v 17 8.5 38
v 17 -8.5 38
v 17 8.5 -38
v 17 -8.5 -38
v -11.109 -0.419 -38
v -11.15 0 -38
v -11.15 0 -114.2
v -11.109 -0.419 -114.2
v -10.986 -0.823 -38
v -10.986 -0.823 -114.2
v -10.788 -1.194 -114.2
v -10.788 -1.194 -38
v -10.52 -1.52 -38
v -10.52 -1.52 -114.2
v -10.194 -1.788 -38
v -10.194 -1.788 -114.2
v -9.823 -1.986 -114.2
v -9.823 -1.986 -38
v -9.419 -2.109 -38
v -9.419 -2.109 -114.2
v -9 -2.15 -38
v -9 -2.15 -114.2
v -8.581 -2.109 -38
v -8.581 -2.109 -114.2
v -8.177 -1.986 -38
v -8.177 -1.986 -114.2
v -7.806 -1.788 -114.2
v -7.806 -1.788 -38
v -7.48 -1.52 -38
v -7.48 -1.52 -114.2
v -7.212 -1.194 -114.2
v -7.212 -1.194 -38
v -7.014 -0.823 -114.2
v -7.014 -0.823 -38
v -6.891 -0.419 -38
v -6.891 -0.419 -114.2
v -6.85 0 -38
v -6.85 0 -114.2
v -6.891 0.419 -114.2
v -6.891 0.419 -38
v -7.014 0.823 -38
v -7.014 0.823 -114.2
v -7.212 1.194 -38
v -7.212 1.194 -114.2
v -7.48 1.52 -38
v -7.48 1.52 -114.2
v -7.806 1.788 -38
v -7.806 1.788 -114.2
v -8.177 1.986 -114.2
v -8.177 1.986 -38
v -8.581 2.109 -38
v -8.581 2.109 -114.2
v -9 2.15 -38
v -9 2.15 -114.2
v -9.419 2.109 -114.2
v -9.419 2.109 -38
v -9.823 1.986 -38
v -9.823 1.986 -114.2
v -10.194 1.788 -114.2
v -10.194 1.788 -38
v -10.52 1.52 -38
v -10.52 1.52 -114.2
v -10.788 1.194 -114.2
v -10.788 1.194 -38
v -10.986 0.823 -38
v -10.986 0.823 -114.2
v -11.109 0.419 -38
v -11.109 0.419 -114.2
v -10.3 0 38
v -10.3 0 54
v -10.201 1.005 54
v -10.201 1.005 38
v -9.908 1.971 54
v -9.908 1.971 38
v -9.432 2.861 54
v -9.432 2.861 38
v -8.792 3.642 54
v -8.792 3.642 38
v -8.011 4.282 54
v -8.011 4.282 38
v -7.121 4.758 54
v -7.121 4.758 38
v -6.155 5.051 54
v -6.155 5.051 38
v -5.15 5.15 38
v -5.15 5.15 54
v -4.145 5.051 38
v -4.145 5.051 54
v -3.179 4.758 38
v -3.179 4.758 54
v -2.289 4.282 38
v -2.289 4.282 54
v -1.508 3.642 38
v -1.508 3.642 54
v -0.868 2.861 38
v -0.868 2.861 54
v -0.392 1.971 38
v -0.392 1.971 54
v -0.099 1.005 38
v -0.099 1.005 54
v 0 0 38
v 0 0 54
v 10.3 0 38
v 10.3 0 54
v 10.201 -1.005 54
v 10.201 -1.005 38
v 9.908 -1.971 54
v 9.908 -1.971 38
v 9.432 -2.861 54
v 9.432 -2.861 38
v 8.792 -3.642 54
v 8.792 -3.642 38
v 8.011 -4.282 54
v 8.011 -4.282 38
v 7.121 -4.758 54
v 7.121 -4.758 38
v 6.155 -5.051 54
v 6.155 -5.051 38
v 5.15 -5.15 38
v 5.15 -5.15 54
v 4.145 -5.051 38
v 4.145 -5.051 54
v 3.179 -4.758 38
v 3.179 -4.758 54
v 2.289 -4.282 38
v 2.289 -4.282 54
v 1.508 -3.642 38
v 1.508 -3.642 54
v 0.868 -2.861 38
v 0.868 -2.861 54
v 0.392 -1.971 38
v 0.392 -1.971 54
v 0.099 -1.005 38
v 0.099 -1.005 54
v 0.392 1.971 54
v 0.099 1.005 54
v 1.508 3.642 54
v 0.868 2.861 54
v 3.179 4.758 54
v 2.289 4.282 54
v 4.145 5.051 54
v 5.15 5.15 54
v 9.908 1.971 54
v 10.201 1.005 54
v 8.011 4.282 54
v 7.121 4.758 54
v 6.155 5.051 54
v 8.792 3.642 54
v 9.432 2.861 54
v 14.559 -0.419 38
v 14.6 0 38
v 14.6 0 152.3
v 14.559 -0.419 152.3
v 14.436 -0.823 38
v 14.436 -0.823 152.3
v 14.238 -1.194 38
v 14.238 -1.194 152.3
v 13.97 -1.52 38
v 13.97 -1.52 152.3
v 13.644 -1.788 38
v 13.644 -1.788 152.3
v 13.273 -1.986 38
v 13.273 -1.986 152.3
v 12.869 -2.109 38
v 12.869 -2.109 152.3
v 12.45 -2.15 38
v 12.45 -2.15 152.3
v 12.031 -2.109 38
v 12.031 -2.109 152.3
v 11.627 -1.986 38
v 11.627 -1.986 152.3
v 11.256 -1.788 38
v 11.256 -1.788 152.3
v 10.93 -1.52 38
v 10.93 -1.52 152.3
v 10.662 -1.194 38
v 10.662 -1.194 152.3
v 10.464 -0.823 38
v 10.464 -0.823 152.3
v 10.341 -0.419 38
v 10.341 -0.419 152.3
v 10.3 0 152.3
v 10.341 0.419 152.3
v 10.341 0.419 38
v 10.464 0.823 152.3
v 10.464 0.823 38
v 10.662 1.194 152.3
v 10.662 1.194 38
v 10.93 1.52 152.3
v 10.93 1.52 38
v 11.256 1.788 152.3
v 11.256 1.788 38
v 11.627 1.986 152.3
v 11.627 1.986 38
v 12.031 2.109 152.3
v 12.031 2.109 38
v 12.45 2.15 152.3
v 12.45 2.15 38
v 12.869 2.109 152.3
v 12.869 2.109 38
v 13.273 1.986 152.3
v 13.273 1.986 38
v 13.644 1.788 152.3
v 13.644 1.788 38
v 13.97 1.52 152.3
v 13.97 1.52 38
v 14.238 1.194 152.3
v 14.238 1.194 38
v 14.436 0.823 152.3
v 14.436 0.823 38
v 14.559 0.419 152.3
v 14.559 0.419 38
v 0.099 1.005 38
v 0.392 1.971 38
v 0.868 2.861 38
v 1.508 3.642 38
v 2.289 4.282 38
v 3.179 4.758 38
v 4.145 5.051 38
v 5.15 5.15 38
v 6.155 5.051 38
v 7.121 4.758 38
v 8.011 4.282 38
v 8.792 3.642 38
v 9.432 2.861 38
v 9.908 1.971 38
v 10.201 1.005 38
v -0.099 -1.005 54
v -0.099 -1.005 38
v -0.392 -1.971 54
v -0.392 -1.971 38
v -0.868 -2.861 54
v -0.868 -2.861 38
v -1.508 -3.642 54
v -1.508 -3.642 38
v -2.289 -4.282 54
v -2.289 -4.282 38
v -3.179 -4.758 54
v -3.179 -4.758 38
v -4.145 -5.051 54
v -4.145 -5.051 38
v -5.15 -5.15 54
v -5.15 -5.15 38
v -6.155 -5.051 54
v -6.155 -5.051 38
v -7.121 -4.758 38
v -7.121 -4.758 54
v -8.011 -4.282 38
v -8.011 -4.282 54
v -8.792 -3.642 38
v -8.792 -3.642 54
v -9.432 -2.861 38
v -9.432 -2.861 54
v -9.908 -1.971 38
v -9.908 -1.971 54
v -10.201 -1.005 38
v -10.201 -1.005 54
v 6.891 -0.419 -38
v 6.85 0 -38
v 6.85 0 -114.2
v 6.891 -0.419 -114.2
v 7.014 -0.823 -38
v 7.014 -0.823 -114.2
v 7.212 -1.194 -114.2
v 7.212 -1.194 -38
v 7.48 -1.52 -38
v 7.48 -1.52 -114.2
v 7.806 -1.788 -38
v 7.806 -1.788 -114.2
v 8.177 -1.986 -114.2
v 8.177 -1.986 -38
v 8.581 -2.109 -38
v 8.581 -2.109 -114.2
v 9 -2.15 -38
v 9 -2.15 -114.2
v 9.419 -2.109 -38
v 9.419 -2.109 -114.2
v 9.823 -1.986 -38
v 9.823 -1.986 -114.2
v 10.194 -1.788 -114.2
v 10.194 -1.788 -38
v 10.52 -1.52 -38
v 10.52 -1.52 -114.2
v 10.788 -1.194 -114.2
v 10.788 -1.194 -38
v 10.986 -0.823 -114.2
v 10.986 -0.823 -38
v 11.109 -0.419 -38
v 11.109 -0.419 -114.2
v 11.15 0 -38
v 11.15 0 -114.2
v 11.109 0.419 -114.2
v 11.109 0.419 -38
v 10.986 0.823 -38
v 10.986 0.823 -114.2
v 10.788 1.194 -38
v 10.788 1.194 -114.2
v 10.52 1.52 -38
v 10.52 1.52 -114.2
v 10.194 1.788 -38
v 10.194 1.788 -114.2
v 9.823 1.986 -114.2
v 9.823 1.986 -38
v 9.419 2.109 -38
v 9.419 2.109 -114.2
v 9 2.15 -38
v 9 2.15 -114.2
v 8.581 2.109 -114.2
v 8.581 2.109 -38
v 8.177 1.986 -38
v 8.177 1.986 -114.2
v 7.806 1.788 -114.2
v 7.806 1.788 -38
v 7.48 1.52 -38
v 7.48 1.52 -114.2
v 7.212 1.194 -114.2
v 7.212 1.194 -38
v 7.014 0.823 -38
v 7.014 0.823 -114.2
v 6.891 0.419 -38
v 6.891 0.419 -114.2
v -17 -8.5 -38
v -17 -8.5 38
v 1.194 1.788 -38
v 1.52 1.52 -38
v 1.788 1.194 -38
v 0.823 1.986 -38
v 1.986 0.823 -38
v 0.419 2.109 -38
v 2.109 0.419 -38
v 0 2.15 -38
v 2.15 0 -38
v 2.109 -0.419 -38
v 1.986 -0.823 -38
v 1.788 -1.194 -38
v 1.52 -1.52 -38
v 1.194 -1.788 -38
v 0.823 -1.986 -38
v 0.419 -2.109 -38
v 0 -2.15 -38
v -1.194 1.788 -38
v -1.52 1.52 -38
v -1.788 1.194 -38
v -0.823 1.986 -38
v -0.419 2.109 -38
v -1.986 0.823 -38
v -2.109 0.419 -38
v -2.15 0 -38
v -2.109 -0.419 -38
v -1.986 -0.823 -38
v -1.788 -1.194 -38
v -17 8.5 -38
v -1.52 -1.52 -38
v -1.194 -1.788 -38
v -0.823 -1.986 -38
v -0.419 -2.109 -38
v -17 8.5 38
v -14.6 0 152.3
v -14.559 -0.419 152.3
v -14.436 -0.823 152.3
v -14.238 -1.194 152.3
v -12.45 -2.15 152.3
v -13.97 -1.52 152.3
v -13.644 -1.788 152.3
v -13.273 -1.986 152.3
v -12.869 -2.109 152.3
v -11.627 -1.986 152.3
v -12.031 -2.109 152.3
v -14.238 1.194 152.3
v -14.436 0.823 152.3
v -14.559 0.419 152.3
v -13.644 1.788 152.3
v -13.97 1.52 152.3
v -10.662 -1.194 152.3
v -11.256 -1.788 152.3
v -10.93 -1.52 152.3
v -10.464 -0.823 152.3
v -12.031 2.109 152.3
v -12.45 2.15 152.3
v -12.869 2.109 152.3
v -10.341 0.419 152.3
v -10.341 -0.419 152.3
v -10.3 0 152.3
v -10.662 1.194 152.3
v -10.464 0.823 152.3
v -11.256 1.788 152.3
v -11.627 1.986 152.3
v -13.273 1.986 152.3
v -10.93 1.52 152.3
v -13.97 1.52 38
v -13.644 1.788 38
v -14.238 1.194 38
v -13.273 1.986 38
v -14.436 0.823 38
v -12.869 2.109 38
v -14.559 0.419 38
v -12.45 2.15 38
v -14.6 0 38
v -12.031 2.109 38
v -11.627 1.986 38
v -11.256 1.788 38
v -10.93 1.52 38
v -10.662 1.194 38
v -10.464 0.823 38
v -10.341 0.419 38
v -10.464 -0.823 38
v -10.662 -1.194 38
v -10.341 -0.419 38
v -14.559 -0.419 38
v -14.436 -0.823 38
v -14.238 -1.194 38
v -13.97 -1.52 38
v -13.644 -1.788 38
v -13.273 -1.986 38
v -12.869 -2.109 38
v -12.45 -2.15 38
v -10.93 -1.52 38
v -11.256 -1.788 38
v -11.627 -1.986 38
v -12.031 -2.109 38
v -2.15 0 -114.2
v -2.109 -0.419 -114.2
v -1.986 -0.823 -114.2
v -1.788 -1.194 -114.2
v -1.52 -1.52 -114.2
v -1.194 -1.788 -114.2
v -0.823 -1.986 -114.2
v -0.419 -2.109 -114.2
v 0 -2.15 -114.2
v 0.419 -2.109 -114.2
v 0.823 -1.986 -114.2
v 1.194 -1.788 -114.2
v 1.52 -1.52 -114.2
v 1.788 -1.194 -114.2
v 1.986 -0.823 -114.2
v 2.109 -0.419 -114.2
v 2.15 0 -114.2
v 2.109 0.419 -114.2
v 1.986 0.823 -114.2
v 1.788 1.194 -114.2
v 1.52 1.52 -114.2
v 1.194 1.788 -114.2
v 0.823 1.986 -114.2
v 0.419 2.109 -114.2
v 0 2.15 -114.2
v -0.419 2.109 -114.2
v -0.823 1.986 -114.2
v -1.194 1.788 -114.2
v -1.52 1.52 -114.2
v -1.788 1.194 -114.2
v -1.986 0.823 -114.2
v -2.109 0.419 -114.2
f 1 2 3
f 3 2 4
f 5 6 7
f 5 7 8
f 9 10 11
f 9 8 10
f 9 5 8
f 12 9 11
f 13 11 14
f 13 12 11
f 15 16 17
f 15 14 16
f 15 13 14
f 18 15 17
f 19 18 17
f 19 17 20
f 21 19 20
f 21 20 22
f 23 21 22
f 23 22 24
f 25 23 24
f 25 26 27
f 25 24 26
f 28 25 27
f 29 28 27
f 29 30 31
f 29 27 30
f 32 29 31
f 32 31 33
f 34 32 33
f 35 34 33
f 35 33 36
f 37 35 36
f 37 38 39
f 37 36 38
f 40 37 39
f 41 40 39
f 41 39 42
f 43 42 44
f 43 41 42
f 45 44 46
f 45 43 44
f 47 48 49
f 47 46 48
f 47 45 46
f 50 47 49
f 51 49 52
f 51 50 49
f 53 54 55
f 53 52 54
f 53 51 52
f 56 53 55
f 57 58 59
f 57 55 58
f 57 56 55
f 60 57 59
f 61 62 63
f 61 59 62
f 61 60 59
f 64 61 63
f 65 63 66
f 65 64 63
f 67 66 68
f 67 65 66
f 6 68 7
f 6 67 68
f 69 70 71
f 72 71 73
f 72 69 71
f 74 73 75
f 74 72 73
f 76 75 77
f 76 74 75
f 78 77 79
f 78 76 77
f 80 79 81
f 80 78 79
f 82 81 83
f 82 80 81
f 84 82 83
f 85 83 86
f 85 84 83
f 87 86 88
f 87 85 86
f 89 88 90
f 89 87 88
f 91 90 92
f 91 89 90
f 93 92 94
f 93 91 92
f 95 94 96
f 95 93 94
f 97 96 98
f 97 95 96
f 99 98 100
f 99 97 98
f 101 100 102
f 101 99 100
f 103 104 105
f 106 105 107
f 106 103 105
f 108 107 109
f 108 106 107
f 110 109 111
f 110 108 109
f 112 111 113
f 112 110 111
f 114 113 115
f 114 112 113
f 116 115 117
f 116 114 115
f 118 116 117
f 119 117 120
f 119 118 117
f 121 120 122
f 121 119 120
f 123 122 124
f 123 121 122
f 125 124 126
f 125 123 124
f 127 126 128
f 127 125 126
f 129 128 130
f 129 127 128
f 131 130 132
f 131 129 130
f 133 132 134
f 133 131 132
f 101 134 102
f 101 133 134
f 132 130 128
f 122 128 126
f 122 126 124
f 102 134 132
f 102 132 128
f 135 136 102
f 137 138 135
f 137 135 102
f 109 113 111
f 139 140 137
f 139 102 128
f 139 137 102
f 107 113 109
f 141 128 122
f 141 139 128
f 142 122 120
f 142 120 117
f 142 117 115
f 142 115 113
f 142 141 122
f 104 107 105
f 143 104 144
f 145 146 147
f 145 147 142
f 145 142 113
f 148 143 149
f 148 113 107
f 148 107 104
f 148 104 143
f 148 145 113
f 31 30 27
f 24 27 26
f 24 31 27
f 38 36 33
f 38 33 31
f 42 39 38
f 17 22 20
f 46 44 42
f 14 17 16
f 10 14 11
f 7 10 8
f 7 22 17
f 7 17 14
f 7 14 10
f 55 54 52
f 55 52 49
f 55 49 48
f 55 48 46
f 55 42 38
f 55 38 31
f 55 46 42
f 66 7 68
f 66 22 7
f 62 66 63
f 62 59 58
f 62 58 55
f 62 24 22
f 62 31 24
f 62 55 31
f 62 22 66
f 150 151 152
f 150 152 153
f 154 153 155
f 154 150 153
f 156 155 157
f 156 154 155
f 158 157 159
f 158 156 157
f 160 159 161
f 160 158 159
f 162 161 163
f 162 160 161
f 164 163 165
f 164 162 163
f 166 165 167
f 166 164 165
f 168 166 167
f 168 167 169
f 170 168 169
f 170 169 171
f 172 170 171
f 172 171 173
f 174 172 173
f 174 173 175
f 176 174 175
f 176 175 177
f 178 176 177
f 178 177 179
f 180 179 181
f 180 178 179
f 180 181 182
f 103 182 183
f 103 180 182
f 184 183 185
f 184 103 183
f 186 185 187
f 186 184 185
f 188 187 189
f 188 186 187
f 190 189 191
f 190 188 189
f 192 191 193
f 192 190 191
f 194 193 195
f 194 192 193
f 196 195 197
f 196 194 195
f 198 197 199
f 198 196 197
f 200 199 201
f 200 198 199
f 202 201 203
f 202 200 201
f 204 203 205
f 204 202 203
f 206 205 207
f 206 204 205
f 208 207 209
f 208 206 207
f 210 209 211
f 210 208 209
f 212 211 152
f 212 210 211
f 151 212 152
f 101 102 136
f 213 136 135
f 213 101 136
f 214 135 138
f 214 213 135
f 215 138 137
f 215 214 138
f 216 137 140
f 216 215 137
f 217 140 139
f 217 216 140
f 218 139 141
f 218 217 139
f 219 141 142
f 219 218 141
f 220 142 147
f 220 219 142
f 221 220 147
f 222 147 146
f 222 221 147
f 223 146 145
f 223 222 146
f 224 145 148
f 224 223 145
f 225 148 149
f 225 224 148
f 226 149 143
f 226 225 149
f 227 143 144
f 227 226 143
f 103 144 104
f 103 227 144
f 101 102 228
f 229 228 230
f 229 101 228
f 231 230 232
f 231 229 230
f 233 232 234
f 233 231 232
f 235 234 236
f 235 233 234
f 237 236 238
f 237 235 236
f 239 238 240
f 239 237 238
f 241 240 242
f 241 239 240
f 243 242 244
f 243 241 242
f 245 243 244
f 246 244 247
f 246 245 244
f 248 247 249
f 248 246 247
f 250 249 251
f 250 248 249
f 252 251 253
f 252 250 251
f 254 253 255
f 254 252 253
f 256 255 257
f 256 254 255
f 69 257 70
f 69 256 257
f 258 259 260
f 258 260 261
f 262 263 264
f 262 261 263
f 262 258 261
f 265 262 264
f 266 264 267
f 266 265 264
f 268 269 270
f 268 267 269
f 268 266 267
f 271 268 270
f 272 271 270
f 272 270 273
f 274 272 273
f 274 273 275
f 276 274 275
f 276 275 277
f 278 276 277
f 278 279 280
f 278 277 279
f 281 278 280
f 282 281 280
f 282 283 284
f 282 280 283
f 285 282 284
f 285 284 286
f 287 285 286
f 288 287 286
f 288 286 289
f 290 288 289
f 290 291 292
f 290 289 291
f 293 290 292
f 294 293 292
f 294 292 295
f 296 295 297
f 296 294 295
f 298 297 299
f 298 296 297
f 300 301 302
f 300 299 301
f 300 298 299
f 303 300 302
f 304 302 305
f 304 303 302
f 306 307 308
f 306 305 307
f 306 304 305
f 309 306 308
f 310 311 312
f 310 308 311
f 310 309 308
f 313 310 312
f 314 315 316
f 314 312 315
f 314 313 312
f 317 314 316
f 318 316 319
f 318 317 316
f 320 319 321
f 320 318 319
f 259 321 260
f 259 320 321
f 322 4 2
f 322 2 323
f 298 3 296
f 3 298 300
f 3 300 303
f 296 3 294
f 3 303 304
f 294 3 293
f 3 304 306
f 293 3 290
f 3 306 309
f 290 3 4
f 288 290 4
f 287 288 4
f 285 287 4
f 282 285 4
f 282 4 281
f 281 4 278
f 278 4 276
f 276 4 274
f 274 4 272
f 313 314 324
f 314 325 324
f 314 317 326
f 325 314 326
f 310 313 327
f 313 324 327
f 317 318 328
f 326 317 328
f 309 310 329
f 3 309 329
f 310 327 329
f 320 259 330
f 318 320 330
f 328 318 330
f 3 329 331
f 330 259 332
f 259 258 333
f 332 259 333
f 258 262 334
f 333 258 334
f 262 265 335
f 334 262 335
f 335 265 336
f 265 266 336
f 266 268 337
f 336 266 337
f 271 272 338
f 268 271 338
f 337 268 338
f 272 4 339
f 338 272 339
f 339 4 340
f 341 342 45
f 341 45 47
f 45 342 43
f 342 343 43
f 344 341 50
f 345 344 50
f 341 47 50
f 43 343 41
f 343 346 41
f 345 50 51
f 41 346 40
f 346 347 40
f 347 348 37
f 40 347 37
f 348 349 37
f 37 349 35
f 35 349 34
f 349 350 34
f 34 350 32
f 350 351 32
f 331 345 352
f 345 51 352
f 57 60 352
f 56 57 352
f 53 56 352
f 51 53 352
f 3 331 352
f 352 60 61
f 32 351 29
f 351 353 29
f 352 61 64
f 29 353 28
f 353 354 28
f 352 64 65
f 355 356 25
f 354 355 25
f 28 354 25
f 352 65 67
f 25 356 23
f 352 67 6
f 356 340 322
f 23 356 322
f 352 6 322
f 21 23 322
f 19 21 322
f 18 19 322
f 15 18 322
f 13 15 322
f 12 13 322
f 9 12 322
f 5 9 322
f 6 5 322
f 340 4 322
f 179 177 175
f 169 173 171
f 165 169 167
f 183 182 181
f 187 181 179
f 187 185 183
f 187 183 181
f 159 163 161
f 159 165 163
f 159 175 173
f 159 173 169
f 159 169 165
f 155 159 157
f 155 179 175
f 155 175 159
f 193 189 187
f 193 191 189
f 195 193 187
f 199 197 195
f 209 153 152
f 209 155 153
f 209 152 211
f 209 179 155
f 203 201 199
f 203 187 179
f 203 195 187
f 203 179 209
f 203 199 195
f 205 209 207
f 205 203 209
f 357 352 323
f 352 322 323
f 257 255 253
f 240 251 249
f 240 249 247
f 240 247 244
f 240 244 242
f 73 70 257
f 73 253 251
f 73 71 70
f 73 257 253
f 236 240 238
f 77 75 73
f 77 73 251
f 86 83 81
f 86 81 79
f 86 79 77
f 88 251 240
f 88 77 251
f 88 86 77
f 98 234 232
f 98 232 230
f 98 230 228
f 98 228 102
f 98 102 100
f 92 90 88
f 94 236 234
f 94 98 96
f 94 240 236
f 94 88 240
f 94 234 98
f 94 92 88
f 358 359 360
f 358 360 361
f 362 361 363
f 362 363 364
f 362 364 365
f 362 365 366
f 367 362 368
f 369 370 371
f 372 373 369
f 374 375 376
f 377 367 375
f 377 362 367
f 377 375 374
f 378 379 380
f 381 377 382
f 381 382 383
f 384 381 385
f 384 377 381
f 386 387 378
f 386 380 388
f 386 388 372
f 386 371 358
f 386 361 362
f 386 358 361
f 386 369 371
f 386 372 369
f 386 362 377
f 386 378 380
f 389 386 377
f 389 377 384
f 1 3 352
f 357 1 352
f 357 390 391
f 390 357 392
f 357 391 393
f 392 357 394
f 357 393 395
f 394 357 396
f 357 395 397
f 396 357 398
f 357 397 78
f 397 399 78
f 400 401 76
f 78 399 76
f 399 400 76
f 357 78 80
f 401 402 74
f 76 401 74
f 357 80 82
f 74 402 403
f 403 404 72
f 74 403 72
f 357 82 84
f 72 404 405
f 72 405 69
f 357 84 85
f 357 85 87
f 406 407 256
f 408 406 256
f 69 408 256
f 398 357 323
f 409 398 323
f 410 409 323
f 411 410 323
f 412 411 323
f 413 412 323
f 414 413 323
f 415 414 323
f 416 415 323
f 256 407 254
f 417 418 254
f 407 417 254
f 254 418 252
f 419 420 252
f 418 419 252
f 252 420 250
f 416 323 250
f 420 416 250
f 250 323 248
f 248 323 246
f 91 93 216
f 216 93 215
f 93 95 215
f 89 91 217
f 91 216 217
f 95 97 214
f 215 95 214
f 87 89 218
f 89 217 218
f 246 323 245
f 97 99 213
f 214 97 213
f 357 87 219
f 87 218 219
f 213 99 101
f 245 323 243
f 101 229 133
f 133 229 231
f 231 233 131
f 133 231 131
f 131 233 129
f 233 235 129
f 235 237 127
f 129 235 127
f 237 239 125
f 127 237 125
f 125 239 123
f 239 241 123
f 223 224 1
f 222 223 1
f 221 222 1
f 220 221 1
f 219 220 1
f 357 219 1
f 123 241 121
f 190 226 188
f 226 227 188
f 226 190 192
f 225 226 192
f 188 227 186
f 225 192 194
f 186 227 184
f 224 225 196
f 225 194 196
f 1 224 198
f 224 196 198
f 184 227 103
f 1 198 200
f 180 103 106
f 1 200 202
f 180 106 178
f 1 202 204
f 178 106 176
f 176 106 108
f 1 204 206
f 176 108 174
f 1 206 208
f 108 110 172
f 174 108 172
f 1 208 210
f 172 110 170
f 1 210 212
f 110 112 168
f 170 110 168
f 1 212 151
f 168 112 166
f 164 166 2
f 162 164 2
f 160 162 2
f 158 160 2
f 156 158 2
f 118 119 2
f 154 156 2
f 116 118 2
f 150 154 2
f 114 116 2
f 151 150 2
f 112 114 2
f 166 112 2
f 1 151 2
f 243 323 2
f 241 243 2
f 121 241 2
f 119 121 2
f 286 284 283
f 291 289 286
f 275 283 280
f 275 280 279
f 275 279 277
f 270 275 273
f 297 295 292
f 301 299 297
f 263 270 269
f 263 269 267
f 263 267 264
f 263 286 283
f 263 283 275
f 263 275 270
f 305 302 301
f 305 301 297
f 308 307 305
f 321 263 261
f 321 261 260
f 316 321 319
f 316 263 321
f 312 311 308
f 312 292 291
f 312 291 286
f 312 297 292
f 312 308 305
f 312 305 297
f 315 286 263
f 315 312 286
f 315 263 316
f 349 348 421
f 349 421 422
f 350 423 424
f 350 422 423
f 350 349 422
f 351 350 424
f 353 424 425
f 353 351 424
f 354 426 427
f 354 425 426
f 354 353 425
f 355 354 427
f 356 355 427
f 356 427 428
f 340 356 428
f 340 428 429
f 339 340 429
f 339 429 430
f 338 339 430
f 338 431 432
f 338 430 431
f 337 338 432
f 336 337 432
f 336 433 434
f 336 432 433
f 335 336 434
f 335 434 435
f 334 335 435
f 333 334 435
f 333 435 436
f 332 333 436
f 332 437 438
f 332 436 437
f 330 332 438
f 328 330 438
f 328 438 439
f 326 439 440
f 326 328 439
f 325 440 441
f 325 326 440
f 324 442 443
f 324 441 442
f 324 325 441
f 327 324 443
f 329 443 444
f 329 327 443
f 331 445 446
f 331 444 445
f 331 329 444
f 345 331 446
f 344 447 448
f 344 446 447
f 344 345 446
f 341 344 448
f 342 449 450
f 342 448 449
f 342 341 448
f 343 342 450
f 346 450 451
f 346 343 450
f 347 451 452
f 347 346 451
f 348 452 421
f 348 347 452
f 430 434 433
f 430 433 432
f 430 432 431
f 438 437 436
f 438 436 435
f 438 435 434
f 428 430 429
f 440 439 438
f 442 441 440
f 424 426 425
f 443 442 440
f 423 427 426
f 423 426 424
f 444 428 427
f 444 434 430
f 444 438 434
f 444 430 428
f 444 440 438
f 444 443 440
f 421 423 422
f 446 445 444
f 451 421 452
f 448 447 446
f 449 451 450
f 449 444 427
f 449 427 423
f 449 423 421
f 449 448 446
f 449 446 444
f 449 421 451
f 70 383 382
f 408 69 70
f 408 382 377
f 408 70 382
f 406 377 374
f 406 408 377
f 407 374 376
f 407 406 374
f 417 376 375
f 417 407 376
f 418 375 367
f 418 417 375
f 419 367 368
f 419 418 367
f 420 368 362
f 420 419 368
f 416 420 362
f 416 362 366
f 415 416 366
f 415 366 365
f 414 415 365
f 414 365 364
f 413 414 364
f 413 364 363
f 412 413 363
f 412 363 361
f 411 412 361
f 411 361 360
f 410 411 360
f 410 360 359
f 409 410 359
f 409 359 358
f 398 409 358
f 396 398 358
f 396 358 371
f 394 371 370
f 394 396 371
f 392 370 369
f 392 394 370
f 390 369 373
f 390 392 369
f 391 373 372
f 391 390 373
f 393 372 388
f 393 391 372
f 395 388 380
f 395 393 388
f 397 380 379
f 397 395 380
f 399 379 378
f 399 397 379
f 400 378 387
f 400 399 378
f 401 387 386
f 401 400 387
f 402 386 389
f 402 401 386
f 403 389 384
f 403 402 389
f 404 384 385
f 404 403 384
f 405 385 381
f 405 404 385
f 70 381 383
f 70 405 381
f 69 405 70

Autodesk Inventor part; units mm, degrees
ref_plane "YZ Plane" through (0, 0, 0) normal (1, 0, 0) x (0, 1, 0)
ref_plane "XZ Plane" through (0, 0, 0) normal (0, 1, 0) x (-1, 0, 0)
ref_plane "XY Plane" through (0, 0, 0) normal (0, 0, 1) x (1, 0, 0)
sketch "Sketch1" plane through (0, 0, 0) normal (0, 1, 0) x (-1, 0, 0)
  line L0 (17, 38) -> (-17, 38)
  line L1 (-17, 38) -> (-17, -38)
  line L2 (-17, -38) -> (17, -38)
  line L3 (17, -38) -> (17, 38)
  line L4 (23.8, 0) -> (-23.8, 0) projected
  line L5 (0, -53.2) -> (0, 53.2) projected
  point P0 (0, 0)
  dimension "d0" = 76
  dimension "d1" = 34
extrude "Extrusion1" add sketch "Sketch1" along normal mid plane 17
sketch "Sketch2" plane through (-17, 8.5, 38) normal (0, 0, 1) x (1, 0, 0)
  line L0 (34, -17) -> (34, 0) projected
  line L1 (0, 0) -> (34, 0) projected
  line L2 (0, 0) -> (0, -17) projected
  line L3 (34, -17) -> (0, -17) projected
  circle A0 centre (11.85, -8.5) radius 5.15
  circle A1 centre (22.15, -8.5) radius 5.15
  line L4 (11.85, -8.5) -> (22.15, -8.5) construction
  circle A2 centre (4.55, -8.5) radius 2.15
  circle A3 centre (29.45, -8.5) radius 2.15
  point P0 (17, -8.5)
  point P1 (17, -8.5)
  dimension "d4" = 10.3
  dimension "d7" = 4.3
extrude "Extrusion2" add sketch "Sketch2" along normal blind 16 contours A0 | A1
extrude "Extrusion3" add sketch "Sketch2" along normal blind 114.3 contours A2 | A3
sketch "Sketch3" plane through (17, 8.5, -38) normal (0, 0, -1) x (-1, 0, 0)
  circle A0 centre (17, -8.5) radius 2.15
  circle A1 centre (26, -8.5) radius 2.15
  circle A2 centre (8, -8.5) radius 2.15
  dimension "d10" = 4.3
  dimension "d11" = 9
  dimension "d12" = 9
extrude "Extrusion4" add sketch "Sketch3" along normal blind 76.2
properties part number "Turnigy_ESC" material "PPS Plastic"
